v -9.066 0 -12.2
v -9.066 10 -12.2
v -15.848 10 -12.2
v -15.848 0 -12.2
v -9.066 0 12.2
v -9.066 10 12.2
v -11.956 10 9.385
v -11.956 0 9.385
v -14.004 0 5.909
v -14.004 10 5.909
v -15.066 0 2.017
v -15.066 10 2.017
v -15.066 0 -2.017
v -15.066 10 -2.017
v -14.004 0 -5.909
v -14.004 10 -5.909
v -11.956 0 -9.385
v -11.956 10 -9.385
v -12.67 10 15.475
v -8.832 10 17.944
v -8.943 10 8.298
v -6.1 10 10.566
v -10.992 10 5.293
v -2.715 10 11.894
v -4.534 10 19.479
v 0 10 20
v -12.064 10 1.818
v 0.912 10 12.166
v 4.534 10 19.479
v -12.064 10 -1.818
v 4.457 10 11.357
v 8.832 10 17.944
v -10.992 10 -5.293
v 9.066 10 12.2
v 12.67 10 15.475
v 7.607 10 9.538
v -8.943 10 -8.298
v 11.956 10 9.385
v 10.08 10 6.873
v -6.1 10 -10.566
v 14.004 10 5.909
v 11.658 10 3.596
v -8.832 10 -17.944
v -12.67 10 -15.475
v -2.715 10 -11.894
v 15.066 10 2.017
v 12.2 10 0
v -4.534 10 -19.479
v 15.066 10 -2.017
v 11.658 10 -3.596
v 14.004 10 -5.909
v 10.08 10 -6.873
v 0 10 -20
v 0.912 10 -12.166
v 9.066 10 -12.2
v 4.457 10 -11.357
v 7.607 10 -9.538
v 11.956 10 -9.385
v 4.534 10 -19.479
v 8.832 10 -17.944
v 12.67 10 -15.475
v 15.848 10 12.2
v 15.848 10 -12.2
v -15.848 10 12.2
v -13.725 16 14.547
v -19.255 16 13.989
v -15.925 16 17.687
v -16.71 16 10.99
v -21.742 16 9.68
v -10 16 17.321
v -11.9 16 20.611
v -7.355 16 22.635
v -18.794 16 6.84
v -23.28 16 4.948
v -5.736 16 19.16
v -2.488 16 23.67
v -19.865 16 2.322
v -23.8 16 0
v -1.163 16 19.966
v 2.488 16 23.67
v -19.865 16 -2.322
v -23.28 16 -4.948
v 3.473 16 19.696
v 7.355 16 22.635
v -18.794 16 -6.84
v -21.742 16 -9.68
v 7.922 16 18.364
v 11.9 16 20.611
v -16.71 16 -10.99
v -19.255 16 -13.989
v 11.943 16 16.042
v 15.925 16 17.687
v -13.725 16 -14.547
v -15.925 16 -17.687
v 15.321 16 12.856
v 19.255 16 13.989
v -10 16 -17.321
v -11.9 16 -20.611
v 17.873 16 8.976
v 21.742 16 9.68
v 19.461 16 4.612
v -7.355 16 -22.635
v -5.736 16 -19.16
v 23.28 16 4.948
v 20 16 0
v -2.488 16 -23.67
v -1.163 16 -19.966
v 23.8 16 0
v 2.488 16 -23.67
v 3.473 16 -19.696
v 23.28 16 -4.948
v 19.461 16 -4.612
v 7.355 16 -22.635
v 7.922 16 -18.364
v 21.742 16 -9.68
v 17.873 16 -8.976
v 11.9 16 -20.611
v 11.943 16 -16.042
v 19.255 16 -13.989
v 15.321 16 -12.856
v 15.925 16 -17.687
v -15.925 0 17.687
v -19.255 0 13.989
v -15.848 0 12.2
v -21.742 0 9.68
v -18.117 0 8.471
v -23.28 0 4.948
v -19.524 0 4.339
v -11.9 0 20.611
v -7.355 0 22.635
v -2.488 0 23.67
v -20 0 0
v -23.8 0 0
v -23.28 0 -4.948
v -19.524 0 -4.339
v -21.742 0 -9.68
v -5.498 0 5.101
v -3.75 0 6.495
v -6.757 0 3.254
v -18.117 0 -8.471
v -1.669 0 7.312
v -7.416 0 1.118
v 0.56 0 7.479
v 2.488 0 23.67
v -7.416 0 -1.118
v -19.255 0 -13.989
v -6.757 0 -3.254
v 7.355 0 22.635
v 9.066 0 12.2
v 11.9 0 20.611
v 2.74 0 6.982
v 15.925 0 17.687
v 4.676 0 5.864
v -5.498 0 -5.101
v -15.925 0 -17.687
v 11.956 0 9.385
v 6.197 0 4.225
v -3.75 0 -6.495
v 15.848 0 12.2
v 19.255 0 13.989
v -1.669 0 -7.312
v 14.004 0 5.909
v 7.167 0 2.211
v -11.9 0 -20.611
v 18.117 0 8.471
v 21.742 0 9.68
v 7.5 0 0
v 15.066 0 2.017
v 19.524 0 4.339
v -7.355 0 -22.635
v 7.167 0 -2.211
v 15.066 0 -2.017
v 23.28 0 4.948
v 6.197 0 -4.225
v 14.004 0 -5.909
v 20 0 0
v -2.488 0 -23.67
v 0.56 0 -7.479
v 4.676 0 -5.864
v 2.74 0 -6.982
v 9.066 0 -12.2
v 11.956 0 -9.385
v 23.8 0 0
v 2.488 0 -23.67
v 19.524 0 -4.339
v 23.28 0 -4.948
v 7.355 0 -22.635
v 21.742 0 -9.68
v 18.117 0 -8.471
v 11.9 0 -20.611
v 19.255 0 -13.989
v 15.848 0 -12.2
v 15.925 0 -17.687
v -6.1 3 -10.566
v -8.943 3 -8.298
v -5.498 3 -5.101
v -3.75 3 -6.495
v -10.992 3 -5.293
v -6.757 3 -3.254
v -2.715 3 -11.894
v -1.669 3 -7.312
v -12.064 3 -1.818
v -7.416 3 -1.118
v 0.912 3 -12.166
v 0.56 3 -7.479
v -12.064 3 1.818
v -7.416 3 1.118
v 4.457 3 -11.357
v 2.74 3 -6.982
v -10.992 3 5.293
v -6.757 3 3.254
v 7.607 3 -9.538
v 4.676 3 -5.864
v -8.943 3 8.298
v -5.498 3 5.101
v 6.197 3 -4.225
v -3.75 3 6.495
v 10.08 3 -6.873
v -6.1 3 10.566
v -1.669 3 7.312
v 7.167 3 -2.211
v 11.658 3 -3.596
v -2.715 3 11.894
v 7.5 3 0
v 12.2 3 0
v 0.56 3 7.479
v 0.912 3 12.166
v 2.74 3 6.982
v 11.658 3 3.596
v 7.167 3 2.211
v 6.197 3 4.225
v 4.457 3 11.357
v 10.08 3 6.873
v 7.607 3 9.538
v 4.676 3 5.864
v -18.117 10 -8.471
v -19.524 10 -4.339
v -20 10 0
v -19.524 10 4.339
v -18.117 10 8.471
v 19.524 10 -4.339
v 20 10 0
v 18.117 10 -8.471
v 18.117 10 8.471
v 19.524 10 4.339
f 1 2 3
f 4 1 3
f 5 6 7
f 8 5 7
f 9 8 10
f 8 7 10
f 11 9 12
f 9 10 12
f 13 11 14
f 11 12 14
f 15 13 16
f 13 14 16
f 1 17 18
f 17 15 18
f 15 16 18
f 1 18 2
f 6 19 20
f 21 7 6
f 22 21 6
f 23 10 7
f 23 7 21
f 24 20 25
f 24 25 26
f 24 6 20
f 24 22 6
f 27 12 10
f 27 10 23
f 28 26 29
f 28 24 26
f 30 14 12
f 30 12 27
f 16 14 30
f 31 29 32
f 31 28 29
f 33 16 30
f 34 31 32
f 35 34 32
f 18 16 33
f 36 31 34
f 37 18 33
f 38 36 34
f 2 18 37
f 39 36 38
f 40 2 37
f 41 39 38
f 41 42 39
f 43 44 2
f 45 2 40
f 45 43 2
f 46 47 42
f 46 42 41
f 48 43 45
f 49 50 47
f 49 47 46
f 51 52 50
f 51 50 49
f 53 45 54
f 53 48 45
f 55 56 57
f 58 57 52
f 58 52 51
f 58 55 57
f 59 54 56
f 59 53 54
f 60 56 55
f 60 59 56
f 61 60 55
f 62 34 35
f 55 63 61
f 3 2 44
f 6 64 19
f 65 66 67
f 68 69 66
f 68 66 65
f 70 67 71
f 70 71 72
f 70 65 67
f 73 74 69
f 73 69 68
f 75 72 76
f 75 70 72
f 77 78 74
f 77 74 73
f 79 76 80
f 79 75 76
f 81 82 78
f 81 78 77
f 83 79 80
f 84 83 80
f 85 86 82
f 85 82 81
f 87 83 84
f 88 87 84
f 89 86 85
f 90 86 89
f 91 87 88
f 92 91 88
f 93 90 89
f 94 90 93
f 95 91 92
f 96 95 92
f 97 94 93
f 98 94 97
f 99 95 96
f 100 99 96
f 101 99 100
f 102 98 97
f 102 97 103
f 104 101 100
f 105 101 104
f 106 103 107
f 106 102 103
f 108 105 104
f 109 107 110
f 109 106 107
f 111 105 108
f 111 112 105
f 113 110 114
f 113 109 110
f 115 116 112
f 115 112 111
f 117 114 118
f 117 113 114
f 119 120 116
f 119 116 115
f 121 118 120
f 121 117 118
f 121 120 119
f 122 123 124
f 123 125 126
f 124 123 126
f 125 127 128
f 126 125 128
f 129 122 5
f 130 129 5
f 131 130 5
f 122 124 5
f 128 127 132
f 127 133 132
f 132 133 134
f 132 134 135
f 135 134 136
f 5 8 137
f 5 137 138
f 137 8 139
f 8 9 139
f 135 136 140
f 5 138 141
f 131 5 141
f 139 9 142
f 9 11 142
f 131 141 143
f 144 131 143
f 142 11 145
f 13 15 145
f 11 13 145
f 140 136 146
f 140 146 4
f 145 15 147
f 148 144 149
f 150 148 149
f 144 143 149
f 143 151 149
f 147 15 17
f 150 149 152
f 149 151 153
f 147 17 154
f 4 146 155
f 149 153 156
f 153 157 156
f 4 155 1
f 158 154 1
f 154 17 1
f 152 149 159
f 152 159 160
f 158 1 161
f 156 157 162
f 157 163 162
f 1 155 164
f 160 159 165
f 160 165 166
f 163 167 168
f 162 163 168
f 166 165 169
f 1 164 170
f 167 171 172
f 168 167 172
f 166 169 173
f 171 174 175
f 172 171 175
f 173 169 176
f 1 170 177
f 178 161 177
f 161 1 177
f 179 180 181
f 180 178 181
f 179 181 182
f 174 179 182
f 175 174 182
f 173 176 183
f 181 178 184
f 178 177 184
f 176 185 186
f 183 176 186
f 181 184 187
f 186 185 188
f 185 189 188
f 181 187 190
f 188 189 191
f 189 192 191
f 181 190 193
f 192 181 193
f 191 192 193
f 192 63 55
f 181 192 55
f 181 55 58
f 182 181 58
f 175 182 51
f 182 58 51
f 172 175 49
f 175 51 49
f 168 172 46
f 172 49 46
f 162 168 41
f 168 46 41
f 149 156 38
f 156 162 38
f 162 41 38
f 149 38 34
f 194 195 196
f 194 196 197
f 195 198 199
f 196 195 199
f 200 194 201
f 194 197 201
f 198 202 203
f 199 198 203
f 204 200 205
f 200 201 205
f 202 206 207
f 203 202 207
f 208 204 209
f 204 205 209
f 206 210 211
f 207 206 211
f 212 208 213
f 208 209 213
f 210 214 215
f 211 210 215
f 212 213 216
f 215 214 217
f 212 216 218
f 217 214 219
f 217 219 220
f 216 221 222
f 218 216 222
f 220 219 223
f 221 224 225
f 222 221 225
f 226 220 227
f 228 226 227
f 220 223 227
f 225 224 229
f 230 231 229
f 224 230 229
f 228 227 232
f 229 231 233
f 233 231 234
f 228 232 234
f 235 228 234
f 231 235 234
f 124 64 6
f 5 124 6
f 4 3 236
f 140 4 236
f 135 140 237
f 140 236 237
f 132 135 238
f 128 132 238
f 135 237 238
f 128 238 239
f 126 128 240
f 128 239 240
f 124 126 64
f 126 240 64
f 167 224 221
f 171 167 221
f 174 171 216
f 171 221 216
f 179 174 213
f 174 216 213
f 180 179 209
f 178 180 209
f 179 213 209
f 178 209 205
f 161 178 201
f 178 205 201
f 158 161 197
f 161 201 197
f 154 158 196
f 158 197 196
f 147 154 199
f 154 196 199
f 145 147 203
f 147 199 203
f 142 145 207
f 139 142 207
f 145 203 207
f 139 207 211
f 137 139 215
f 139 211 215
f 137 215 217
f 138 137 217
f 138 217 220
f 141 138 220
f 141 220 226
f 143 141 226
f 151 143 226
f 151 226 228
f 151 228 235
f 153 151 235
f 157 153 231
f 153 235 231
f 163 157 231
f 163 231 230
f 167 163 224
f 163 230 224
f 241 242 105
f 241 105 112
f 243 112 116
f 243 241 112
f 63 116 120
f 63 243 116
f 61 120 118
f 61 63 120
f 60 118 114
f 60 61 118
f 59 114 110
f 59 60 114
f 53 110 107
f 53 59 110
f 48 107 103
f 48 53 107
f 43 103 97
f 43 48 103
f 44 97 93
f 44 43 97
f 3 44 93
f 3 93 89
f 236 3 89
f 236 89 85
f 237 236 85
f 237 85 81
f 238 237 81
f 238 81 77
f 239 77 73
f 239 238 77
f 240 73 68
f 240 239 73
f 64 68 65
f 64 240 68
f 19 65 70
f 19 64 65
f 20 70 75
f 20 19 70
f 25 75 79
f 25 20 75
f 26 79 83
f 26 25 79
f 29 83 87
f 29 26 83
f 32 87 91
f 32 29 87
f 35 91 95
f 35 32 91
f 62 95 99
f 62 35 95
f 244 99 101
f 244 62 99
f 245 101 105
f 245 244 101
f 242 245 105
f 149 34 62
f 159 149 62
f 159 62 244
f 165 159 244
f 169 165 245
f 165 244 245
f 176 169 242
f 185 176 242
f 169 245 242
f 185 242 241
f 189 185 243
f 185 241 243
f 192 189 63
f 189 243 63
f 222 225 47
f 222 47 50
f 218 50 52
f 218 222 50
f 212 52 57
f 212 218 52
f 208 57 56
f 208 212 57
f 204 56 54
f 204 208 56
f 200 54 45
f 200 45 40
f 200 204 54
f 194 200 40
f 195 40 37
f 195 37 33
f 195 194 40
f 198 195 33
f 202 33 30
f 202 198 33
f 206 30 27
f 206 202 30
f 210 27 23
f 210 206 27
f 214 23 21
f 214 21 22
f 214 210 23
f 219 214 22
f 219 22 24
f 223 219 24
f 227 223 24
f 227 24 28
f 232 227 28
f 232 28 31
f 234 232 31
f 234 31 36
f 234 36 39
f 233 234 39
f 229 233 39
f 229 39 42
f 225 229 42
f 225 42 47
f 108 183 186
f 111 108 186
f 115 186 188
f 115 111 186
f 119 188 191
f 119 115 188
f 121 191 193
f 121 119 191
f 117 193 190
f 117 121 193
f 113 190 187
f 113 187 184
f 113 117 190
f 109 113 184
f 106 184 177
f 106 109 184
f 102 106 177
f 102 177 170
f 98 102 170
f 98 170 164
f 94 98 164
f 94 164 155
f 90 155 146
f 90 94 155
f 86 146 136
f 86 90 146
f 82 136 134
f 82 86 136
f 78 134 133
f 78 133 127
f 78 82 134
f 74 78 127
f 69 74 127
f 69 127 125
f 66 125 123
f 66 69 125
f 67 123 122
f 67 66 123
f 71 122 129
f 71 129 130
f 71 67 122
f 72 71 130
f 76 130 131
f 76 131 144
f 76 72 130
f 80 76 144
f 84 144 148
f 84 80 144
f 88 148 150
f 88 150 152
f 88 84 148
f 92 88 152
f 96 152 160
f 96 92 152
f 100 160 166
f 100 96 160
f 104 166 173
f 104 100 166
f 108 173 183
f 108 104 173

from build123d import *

# Parameters (mm, degrees)
SKETCH1_R           = 23.2
SKETCH1_R_2         = 12.2
BOSS_EXTRUDE1_DEPTH = 10
SKETCH2_R           = 12.2
BOSS_EXTRUDE2_DEPTH = 3
SKETCH3_R           = 7.5
CUT_EXTRUDE1_DEPTH  = 3
SKETCH4_R           = 23.2
SKETCH4_R_2         = 20
BOSS_EXTRUDE3_DEPTH = 6
CUT_EXTRUDE3_DEPTH  = 59
SKETCH8_R           = 23.8
SKETCH8_R_2         = 23.2
BOSS_EXTRUDE4_DEPTH = 16


with BuildPart() as part:
    # Sketch1 → Boss-Extrude1 (new body)
    with BuildSketch(Plane(origin=(0, 0, 0), x_dir=(1, 0, 0), z_dir=(0, 1, 0))):
        Circle(SKETCH1_R)
        Circle(SKETCH1_R_2, mode=Mode.SUBTRACT)
    extrude(amount=BOSS_EXTRUDE1_DEPTH)

    # Sketch2 → Boss-Extrude2 (add)
    with BuildSketch(Plane.XZ):
        Circle(SKETCH2_R)
    extrude(amount=-BOSS_EXTRUDE2_DEPTH)

    # Sketch3 → Cut-Extrude1 (cut)
    with BuildSketch(Plane(origin=(0, 3, 0), x_dir=(1, 0, 0), z_dir=(0, 1, 0))):
        Circle(SKETCH3_R)
    extrude(amount=-CUT_EXTRUDE1_DEPTH, mode=Mode.SUBTRACT)

    # Sketch4 → Boss-Extrude3 (add)
    with BuildSketch(Plane(origin=(0, 10, 0), x_dir=(1, 0, 0), z_dir=(0, 1, 0))):
        Circle(SKETCH4_R)
        Circle(SKETCH4_R_2, mode=Mode.SUBTRACT)
    extrude(amount=BOSS_EXTRUDE3_DEPTH)

    # Sketch6 → Cut-Extrude3 (cut)
    with BuildSketch(Plane(origin=(0, 10, 0), x_dir=(1, 0, 0), z_dir=(0, 1, 0))):
        with BuildLine():
            Line((15.848028, 12.2), (9.066422, 12.2))
            ThreePointArc((9.066422, 12.2), (15.2, 0), (9.066422, -12.2))
            Line((9.066422, -12.2), (15.848028, -12.2))
            ThreePointArc((15.848028, -12.2), (20, 0), (15.848028, 12.2))
        make_face()
        with BuildLine():
            ThreePointArc((-9.066422, -12.2), (-15.2, 0), (-9.066422, 12.2))
            Line((-9.066422, 12.2), (-15.848028, 12.2))
            ThreePointArc((-15.848028, 12.2), (-20, 0), (-15.848028, -12.2))
            Line((-15.848028, -12.2), (-9.066422, -12.2))
        make_face()
    extrude(amount=-CUT_EXTRUDE3_DEPTH, mode=Mode.SUBTRACT)

    # Sketch8 → Boss-Extrude4 (add)
    with BuildSketch(Plane(origin=(0, 16, 0), x_dir=(1, 0, 0), z_dir=(0, 1, 0))):
        Circle(SKETCH8_R)
        Circle(SKETCH8_R_2, mode=Mode.SUBTRACT)
    extrude(amount=-BOSS_EXTRUDE4_DEPTH)


solid = part.part
